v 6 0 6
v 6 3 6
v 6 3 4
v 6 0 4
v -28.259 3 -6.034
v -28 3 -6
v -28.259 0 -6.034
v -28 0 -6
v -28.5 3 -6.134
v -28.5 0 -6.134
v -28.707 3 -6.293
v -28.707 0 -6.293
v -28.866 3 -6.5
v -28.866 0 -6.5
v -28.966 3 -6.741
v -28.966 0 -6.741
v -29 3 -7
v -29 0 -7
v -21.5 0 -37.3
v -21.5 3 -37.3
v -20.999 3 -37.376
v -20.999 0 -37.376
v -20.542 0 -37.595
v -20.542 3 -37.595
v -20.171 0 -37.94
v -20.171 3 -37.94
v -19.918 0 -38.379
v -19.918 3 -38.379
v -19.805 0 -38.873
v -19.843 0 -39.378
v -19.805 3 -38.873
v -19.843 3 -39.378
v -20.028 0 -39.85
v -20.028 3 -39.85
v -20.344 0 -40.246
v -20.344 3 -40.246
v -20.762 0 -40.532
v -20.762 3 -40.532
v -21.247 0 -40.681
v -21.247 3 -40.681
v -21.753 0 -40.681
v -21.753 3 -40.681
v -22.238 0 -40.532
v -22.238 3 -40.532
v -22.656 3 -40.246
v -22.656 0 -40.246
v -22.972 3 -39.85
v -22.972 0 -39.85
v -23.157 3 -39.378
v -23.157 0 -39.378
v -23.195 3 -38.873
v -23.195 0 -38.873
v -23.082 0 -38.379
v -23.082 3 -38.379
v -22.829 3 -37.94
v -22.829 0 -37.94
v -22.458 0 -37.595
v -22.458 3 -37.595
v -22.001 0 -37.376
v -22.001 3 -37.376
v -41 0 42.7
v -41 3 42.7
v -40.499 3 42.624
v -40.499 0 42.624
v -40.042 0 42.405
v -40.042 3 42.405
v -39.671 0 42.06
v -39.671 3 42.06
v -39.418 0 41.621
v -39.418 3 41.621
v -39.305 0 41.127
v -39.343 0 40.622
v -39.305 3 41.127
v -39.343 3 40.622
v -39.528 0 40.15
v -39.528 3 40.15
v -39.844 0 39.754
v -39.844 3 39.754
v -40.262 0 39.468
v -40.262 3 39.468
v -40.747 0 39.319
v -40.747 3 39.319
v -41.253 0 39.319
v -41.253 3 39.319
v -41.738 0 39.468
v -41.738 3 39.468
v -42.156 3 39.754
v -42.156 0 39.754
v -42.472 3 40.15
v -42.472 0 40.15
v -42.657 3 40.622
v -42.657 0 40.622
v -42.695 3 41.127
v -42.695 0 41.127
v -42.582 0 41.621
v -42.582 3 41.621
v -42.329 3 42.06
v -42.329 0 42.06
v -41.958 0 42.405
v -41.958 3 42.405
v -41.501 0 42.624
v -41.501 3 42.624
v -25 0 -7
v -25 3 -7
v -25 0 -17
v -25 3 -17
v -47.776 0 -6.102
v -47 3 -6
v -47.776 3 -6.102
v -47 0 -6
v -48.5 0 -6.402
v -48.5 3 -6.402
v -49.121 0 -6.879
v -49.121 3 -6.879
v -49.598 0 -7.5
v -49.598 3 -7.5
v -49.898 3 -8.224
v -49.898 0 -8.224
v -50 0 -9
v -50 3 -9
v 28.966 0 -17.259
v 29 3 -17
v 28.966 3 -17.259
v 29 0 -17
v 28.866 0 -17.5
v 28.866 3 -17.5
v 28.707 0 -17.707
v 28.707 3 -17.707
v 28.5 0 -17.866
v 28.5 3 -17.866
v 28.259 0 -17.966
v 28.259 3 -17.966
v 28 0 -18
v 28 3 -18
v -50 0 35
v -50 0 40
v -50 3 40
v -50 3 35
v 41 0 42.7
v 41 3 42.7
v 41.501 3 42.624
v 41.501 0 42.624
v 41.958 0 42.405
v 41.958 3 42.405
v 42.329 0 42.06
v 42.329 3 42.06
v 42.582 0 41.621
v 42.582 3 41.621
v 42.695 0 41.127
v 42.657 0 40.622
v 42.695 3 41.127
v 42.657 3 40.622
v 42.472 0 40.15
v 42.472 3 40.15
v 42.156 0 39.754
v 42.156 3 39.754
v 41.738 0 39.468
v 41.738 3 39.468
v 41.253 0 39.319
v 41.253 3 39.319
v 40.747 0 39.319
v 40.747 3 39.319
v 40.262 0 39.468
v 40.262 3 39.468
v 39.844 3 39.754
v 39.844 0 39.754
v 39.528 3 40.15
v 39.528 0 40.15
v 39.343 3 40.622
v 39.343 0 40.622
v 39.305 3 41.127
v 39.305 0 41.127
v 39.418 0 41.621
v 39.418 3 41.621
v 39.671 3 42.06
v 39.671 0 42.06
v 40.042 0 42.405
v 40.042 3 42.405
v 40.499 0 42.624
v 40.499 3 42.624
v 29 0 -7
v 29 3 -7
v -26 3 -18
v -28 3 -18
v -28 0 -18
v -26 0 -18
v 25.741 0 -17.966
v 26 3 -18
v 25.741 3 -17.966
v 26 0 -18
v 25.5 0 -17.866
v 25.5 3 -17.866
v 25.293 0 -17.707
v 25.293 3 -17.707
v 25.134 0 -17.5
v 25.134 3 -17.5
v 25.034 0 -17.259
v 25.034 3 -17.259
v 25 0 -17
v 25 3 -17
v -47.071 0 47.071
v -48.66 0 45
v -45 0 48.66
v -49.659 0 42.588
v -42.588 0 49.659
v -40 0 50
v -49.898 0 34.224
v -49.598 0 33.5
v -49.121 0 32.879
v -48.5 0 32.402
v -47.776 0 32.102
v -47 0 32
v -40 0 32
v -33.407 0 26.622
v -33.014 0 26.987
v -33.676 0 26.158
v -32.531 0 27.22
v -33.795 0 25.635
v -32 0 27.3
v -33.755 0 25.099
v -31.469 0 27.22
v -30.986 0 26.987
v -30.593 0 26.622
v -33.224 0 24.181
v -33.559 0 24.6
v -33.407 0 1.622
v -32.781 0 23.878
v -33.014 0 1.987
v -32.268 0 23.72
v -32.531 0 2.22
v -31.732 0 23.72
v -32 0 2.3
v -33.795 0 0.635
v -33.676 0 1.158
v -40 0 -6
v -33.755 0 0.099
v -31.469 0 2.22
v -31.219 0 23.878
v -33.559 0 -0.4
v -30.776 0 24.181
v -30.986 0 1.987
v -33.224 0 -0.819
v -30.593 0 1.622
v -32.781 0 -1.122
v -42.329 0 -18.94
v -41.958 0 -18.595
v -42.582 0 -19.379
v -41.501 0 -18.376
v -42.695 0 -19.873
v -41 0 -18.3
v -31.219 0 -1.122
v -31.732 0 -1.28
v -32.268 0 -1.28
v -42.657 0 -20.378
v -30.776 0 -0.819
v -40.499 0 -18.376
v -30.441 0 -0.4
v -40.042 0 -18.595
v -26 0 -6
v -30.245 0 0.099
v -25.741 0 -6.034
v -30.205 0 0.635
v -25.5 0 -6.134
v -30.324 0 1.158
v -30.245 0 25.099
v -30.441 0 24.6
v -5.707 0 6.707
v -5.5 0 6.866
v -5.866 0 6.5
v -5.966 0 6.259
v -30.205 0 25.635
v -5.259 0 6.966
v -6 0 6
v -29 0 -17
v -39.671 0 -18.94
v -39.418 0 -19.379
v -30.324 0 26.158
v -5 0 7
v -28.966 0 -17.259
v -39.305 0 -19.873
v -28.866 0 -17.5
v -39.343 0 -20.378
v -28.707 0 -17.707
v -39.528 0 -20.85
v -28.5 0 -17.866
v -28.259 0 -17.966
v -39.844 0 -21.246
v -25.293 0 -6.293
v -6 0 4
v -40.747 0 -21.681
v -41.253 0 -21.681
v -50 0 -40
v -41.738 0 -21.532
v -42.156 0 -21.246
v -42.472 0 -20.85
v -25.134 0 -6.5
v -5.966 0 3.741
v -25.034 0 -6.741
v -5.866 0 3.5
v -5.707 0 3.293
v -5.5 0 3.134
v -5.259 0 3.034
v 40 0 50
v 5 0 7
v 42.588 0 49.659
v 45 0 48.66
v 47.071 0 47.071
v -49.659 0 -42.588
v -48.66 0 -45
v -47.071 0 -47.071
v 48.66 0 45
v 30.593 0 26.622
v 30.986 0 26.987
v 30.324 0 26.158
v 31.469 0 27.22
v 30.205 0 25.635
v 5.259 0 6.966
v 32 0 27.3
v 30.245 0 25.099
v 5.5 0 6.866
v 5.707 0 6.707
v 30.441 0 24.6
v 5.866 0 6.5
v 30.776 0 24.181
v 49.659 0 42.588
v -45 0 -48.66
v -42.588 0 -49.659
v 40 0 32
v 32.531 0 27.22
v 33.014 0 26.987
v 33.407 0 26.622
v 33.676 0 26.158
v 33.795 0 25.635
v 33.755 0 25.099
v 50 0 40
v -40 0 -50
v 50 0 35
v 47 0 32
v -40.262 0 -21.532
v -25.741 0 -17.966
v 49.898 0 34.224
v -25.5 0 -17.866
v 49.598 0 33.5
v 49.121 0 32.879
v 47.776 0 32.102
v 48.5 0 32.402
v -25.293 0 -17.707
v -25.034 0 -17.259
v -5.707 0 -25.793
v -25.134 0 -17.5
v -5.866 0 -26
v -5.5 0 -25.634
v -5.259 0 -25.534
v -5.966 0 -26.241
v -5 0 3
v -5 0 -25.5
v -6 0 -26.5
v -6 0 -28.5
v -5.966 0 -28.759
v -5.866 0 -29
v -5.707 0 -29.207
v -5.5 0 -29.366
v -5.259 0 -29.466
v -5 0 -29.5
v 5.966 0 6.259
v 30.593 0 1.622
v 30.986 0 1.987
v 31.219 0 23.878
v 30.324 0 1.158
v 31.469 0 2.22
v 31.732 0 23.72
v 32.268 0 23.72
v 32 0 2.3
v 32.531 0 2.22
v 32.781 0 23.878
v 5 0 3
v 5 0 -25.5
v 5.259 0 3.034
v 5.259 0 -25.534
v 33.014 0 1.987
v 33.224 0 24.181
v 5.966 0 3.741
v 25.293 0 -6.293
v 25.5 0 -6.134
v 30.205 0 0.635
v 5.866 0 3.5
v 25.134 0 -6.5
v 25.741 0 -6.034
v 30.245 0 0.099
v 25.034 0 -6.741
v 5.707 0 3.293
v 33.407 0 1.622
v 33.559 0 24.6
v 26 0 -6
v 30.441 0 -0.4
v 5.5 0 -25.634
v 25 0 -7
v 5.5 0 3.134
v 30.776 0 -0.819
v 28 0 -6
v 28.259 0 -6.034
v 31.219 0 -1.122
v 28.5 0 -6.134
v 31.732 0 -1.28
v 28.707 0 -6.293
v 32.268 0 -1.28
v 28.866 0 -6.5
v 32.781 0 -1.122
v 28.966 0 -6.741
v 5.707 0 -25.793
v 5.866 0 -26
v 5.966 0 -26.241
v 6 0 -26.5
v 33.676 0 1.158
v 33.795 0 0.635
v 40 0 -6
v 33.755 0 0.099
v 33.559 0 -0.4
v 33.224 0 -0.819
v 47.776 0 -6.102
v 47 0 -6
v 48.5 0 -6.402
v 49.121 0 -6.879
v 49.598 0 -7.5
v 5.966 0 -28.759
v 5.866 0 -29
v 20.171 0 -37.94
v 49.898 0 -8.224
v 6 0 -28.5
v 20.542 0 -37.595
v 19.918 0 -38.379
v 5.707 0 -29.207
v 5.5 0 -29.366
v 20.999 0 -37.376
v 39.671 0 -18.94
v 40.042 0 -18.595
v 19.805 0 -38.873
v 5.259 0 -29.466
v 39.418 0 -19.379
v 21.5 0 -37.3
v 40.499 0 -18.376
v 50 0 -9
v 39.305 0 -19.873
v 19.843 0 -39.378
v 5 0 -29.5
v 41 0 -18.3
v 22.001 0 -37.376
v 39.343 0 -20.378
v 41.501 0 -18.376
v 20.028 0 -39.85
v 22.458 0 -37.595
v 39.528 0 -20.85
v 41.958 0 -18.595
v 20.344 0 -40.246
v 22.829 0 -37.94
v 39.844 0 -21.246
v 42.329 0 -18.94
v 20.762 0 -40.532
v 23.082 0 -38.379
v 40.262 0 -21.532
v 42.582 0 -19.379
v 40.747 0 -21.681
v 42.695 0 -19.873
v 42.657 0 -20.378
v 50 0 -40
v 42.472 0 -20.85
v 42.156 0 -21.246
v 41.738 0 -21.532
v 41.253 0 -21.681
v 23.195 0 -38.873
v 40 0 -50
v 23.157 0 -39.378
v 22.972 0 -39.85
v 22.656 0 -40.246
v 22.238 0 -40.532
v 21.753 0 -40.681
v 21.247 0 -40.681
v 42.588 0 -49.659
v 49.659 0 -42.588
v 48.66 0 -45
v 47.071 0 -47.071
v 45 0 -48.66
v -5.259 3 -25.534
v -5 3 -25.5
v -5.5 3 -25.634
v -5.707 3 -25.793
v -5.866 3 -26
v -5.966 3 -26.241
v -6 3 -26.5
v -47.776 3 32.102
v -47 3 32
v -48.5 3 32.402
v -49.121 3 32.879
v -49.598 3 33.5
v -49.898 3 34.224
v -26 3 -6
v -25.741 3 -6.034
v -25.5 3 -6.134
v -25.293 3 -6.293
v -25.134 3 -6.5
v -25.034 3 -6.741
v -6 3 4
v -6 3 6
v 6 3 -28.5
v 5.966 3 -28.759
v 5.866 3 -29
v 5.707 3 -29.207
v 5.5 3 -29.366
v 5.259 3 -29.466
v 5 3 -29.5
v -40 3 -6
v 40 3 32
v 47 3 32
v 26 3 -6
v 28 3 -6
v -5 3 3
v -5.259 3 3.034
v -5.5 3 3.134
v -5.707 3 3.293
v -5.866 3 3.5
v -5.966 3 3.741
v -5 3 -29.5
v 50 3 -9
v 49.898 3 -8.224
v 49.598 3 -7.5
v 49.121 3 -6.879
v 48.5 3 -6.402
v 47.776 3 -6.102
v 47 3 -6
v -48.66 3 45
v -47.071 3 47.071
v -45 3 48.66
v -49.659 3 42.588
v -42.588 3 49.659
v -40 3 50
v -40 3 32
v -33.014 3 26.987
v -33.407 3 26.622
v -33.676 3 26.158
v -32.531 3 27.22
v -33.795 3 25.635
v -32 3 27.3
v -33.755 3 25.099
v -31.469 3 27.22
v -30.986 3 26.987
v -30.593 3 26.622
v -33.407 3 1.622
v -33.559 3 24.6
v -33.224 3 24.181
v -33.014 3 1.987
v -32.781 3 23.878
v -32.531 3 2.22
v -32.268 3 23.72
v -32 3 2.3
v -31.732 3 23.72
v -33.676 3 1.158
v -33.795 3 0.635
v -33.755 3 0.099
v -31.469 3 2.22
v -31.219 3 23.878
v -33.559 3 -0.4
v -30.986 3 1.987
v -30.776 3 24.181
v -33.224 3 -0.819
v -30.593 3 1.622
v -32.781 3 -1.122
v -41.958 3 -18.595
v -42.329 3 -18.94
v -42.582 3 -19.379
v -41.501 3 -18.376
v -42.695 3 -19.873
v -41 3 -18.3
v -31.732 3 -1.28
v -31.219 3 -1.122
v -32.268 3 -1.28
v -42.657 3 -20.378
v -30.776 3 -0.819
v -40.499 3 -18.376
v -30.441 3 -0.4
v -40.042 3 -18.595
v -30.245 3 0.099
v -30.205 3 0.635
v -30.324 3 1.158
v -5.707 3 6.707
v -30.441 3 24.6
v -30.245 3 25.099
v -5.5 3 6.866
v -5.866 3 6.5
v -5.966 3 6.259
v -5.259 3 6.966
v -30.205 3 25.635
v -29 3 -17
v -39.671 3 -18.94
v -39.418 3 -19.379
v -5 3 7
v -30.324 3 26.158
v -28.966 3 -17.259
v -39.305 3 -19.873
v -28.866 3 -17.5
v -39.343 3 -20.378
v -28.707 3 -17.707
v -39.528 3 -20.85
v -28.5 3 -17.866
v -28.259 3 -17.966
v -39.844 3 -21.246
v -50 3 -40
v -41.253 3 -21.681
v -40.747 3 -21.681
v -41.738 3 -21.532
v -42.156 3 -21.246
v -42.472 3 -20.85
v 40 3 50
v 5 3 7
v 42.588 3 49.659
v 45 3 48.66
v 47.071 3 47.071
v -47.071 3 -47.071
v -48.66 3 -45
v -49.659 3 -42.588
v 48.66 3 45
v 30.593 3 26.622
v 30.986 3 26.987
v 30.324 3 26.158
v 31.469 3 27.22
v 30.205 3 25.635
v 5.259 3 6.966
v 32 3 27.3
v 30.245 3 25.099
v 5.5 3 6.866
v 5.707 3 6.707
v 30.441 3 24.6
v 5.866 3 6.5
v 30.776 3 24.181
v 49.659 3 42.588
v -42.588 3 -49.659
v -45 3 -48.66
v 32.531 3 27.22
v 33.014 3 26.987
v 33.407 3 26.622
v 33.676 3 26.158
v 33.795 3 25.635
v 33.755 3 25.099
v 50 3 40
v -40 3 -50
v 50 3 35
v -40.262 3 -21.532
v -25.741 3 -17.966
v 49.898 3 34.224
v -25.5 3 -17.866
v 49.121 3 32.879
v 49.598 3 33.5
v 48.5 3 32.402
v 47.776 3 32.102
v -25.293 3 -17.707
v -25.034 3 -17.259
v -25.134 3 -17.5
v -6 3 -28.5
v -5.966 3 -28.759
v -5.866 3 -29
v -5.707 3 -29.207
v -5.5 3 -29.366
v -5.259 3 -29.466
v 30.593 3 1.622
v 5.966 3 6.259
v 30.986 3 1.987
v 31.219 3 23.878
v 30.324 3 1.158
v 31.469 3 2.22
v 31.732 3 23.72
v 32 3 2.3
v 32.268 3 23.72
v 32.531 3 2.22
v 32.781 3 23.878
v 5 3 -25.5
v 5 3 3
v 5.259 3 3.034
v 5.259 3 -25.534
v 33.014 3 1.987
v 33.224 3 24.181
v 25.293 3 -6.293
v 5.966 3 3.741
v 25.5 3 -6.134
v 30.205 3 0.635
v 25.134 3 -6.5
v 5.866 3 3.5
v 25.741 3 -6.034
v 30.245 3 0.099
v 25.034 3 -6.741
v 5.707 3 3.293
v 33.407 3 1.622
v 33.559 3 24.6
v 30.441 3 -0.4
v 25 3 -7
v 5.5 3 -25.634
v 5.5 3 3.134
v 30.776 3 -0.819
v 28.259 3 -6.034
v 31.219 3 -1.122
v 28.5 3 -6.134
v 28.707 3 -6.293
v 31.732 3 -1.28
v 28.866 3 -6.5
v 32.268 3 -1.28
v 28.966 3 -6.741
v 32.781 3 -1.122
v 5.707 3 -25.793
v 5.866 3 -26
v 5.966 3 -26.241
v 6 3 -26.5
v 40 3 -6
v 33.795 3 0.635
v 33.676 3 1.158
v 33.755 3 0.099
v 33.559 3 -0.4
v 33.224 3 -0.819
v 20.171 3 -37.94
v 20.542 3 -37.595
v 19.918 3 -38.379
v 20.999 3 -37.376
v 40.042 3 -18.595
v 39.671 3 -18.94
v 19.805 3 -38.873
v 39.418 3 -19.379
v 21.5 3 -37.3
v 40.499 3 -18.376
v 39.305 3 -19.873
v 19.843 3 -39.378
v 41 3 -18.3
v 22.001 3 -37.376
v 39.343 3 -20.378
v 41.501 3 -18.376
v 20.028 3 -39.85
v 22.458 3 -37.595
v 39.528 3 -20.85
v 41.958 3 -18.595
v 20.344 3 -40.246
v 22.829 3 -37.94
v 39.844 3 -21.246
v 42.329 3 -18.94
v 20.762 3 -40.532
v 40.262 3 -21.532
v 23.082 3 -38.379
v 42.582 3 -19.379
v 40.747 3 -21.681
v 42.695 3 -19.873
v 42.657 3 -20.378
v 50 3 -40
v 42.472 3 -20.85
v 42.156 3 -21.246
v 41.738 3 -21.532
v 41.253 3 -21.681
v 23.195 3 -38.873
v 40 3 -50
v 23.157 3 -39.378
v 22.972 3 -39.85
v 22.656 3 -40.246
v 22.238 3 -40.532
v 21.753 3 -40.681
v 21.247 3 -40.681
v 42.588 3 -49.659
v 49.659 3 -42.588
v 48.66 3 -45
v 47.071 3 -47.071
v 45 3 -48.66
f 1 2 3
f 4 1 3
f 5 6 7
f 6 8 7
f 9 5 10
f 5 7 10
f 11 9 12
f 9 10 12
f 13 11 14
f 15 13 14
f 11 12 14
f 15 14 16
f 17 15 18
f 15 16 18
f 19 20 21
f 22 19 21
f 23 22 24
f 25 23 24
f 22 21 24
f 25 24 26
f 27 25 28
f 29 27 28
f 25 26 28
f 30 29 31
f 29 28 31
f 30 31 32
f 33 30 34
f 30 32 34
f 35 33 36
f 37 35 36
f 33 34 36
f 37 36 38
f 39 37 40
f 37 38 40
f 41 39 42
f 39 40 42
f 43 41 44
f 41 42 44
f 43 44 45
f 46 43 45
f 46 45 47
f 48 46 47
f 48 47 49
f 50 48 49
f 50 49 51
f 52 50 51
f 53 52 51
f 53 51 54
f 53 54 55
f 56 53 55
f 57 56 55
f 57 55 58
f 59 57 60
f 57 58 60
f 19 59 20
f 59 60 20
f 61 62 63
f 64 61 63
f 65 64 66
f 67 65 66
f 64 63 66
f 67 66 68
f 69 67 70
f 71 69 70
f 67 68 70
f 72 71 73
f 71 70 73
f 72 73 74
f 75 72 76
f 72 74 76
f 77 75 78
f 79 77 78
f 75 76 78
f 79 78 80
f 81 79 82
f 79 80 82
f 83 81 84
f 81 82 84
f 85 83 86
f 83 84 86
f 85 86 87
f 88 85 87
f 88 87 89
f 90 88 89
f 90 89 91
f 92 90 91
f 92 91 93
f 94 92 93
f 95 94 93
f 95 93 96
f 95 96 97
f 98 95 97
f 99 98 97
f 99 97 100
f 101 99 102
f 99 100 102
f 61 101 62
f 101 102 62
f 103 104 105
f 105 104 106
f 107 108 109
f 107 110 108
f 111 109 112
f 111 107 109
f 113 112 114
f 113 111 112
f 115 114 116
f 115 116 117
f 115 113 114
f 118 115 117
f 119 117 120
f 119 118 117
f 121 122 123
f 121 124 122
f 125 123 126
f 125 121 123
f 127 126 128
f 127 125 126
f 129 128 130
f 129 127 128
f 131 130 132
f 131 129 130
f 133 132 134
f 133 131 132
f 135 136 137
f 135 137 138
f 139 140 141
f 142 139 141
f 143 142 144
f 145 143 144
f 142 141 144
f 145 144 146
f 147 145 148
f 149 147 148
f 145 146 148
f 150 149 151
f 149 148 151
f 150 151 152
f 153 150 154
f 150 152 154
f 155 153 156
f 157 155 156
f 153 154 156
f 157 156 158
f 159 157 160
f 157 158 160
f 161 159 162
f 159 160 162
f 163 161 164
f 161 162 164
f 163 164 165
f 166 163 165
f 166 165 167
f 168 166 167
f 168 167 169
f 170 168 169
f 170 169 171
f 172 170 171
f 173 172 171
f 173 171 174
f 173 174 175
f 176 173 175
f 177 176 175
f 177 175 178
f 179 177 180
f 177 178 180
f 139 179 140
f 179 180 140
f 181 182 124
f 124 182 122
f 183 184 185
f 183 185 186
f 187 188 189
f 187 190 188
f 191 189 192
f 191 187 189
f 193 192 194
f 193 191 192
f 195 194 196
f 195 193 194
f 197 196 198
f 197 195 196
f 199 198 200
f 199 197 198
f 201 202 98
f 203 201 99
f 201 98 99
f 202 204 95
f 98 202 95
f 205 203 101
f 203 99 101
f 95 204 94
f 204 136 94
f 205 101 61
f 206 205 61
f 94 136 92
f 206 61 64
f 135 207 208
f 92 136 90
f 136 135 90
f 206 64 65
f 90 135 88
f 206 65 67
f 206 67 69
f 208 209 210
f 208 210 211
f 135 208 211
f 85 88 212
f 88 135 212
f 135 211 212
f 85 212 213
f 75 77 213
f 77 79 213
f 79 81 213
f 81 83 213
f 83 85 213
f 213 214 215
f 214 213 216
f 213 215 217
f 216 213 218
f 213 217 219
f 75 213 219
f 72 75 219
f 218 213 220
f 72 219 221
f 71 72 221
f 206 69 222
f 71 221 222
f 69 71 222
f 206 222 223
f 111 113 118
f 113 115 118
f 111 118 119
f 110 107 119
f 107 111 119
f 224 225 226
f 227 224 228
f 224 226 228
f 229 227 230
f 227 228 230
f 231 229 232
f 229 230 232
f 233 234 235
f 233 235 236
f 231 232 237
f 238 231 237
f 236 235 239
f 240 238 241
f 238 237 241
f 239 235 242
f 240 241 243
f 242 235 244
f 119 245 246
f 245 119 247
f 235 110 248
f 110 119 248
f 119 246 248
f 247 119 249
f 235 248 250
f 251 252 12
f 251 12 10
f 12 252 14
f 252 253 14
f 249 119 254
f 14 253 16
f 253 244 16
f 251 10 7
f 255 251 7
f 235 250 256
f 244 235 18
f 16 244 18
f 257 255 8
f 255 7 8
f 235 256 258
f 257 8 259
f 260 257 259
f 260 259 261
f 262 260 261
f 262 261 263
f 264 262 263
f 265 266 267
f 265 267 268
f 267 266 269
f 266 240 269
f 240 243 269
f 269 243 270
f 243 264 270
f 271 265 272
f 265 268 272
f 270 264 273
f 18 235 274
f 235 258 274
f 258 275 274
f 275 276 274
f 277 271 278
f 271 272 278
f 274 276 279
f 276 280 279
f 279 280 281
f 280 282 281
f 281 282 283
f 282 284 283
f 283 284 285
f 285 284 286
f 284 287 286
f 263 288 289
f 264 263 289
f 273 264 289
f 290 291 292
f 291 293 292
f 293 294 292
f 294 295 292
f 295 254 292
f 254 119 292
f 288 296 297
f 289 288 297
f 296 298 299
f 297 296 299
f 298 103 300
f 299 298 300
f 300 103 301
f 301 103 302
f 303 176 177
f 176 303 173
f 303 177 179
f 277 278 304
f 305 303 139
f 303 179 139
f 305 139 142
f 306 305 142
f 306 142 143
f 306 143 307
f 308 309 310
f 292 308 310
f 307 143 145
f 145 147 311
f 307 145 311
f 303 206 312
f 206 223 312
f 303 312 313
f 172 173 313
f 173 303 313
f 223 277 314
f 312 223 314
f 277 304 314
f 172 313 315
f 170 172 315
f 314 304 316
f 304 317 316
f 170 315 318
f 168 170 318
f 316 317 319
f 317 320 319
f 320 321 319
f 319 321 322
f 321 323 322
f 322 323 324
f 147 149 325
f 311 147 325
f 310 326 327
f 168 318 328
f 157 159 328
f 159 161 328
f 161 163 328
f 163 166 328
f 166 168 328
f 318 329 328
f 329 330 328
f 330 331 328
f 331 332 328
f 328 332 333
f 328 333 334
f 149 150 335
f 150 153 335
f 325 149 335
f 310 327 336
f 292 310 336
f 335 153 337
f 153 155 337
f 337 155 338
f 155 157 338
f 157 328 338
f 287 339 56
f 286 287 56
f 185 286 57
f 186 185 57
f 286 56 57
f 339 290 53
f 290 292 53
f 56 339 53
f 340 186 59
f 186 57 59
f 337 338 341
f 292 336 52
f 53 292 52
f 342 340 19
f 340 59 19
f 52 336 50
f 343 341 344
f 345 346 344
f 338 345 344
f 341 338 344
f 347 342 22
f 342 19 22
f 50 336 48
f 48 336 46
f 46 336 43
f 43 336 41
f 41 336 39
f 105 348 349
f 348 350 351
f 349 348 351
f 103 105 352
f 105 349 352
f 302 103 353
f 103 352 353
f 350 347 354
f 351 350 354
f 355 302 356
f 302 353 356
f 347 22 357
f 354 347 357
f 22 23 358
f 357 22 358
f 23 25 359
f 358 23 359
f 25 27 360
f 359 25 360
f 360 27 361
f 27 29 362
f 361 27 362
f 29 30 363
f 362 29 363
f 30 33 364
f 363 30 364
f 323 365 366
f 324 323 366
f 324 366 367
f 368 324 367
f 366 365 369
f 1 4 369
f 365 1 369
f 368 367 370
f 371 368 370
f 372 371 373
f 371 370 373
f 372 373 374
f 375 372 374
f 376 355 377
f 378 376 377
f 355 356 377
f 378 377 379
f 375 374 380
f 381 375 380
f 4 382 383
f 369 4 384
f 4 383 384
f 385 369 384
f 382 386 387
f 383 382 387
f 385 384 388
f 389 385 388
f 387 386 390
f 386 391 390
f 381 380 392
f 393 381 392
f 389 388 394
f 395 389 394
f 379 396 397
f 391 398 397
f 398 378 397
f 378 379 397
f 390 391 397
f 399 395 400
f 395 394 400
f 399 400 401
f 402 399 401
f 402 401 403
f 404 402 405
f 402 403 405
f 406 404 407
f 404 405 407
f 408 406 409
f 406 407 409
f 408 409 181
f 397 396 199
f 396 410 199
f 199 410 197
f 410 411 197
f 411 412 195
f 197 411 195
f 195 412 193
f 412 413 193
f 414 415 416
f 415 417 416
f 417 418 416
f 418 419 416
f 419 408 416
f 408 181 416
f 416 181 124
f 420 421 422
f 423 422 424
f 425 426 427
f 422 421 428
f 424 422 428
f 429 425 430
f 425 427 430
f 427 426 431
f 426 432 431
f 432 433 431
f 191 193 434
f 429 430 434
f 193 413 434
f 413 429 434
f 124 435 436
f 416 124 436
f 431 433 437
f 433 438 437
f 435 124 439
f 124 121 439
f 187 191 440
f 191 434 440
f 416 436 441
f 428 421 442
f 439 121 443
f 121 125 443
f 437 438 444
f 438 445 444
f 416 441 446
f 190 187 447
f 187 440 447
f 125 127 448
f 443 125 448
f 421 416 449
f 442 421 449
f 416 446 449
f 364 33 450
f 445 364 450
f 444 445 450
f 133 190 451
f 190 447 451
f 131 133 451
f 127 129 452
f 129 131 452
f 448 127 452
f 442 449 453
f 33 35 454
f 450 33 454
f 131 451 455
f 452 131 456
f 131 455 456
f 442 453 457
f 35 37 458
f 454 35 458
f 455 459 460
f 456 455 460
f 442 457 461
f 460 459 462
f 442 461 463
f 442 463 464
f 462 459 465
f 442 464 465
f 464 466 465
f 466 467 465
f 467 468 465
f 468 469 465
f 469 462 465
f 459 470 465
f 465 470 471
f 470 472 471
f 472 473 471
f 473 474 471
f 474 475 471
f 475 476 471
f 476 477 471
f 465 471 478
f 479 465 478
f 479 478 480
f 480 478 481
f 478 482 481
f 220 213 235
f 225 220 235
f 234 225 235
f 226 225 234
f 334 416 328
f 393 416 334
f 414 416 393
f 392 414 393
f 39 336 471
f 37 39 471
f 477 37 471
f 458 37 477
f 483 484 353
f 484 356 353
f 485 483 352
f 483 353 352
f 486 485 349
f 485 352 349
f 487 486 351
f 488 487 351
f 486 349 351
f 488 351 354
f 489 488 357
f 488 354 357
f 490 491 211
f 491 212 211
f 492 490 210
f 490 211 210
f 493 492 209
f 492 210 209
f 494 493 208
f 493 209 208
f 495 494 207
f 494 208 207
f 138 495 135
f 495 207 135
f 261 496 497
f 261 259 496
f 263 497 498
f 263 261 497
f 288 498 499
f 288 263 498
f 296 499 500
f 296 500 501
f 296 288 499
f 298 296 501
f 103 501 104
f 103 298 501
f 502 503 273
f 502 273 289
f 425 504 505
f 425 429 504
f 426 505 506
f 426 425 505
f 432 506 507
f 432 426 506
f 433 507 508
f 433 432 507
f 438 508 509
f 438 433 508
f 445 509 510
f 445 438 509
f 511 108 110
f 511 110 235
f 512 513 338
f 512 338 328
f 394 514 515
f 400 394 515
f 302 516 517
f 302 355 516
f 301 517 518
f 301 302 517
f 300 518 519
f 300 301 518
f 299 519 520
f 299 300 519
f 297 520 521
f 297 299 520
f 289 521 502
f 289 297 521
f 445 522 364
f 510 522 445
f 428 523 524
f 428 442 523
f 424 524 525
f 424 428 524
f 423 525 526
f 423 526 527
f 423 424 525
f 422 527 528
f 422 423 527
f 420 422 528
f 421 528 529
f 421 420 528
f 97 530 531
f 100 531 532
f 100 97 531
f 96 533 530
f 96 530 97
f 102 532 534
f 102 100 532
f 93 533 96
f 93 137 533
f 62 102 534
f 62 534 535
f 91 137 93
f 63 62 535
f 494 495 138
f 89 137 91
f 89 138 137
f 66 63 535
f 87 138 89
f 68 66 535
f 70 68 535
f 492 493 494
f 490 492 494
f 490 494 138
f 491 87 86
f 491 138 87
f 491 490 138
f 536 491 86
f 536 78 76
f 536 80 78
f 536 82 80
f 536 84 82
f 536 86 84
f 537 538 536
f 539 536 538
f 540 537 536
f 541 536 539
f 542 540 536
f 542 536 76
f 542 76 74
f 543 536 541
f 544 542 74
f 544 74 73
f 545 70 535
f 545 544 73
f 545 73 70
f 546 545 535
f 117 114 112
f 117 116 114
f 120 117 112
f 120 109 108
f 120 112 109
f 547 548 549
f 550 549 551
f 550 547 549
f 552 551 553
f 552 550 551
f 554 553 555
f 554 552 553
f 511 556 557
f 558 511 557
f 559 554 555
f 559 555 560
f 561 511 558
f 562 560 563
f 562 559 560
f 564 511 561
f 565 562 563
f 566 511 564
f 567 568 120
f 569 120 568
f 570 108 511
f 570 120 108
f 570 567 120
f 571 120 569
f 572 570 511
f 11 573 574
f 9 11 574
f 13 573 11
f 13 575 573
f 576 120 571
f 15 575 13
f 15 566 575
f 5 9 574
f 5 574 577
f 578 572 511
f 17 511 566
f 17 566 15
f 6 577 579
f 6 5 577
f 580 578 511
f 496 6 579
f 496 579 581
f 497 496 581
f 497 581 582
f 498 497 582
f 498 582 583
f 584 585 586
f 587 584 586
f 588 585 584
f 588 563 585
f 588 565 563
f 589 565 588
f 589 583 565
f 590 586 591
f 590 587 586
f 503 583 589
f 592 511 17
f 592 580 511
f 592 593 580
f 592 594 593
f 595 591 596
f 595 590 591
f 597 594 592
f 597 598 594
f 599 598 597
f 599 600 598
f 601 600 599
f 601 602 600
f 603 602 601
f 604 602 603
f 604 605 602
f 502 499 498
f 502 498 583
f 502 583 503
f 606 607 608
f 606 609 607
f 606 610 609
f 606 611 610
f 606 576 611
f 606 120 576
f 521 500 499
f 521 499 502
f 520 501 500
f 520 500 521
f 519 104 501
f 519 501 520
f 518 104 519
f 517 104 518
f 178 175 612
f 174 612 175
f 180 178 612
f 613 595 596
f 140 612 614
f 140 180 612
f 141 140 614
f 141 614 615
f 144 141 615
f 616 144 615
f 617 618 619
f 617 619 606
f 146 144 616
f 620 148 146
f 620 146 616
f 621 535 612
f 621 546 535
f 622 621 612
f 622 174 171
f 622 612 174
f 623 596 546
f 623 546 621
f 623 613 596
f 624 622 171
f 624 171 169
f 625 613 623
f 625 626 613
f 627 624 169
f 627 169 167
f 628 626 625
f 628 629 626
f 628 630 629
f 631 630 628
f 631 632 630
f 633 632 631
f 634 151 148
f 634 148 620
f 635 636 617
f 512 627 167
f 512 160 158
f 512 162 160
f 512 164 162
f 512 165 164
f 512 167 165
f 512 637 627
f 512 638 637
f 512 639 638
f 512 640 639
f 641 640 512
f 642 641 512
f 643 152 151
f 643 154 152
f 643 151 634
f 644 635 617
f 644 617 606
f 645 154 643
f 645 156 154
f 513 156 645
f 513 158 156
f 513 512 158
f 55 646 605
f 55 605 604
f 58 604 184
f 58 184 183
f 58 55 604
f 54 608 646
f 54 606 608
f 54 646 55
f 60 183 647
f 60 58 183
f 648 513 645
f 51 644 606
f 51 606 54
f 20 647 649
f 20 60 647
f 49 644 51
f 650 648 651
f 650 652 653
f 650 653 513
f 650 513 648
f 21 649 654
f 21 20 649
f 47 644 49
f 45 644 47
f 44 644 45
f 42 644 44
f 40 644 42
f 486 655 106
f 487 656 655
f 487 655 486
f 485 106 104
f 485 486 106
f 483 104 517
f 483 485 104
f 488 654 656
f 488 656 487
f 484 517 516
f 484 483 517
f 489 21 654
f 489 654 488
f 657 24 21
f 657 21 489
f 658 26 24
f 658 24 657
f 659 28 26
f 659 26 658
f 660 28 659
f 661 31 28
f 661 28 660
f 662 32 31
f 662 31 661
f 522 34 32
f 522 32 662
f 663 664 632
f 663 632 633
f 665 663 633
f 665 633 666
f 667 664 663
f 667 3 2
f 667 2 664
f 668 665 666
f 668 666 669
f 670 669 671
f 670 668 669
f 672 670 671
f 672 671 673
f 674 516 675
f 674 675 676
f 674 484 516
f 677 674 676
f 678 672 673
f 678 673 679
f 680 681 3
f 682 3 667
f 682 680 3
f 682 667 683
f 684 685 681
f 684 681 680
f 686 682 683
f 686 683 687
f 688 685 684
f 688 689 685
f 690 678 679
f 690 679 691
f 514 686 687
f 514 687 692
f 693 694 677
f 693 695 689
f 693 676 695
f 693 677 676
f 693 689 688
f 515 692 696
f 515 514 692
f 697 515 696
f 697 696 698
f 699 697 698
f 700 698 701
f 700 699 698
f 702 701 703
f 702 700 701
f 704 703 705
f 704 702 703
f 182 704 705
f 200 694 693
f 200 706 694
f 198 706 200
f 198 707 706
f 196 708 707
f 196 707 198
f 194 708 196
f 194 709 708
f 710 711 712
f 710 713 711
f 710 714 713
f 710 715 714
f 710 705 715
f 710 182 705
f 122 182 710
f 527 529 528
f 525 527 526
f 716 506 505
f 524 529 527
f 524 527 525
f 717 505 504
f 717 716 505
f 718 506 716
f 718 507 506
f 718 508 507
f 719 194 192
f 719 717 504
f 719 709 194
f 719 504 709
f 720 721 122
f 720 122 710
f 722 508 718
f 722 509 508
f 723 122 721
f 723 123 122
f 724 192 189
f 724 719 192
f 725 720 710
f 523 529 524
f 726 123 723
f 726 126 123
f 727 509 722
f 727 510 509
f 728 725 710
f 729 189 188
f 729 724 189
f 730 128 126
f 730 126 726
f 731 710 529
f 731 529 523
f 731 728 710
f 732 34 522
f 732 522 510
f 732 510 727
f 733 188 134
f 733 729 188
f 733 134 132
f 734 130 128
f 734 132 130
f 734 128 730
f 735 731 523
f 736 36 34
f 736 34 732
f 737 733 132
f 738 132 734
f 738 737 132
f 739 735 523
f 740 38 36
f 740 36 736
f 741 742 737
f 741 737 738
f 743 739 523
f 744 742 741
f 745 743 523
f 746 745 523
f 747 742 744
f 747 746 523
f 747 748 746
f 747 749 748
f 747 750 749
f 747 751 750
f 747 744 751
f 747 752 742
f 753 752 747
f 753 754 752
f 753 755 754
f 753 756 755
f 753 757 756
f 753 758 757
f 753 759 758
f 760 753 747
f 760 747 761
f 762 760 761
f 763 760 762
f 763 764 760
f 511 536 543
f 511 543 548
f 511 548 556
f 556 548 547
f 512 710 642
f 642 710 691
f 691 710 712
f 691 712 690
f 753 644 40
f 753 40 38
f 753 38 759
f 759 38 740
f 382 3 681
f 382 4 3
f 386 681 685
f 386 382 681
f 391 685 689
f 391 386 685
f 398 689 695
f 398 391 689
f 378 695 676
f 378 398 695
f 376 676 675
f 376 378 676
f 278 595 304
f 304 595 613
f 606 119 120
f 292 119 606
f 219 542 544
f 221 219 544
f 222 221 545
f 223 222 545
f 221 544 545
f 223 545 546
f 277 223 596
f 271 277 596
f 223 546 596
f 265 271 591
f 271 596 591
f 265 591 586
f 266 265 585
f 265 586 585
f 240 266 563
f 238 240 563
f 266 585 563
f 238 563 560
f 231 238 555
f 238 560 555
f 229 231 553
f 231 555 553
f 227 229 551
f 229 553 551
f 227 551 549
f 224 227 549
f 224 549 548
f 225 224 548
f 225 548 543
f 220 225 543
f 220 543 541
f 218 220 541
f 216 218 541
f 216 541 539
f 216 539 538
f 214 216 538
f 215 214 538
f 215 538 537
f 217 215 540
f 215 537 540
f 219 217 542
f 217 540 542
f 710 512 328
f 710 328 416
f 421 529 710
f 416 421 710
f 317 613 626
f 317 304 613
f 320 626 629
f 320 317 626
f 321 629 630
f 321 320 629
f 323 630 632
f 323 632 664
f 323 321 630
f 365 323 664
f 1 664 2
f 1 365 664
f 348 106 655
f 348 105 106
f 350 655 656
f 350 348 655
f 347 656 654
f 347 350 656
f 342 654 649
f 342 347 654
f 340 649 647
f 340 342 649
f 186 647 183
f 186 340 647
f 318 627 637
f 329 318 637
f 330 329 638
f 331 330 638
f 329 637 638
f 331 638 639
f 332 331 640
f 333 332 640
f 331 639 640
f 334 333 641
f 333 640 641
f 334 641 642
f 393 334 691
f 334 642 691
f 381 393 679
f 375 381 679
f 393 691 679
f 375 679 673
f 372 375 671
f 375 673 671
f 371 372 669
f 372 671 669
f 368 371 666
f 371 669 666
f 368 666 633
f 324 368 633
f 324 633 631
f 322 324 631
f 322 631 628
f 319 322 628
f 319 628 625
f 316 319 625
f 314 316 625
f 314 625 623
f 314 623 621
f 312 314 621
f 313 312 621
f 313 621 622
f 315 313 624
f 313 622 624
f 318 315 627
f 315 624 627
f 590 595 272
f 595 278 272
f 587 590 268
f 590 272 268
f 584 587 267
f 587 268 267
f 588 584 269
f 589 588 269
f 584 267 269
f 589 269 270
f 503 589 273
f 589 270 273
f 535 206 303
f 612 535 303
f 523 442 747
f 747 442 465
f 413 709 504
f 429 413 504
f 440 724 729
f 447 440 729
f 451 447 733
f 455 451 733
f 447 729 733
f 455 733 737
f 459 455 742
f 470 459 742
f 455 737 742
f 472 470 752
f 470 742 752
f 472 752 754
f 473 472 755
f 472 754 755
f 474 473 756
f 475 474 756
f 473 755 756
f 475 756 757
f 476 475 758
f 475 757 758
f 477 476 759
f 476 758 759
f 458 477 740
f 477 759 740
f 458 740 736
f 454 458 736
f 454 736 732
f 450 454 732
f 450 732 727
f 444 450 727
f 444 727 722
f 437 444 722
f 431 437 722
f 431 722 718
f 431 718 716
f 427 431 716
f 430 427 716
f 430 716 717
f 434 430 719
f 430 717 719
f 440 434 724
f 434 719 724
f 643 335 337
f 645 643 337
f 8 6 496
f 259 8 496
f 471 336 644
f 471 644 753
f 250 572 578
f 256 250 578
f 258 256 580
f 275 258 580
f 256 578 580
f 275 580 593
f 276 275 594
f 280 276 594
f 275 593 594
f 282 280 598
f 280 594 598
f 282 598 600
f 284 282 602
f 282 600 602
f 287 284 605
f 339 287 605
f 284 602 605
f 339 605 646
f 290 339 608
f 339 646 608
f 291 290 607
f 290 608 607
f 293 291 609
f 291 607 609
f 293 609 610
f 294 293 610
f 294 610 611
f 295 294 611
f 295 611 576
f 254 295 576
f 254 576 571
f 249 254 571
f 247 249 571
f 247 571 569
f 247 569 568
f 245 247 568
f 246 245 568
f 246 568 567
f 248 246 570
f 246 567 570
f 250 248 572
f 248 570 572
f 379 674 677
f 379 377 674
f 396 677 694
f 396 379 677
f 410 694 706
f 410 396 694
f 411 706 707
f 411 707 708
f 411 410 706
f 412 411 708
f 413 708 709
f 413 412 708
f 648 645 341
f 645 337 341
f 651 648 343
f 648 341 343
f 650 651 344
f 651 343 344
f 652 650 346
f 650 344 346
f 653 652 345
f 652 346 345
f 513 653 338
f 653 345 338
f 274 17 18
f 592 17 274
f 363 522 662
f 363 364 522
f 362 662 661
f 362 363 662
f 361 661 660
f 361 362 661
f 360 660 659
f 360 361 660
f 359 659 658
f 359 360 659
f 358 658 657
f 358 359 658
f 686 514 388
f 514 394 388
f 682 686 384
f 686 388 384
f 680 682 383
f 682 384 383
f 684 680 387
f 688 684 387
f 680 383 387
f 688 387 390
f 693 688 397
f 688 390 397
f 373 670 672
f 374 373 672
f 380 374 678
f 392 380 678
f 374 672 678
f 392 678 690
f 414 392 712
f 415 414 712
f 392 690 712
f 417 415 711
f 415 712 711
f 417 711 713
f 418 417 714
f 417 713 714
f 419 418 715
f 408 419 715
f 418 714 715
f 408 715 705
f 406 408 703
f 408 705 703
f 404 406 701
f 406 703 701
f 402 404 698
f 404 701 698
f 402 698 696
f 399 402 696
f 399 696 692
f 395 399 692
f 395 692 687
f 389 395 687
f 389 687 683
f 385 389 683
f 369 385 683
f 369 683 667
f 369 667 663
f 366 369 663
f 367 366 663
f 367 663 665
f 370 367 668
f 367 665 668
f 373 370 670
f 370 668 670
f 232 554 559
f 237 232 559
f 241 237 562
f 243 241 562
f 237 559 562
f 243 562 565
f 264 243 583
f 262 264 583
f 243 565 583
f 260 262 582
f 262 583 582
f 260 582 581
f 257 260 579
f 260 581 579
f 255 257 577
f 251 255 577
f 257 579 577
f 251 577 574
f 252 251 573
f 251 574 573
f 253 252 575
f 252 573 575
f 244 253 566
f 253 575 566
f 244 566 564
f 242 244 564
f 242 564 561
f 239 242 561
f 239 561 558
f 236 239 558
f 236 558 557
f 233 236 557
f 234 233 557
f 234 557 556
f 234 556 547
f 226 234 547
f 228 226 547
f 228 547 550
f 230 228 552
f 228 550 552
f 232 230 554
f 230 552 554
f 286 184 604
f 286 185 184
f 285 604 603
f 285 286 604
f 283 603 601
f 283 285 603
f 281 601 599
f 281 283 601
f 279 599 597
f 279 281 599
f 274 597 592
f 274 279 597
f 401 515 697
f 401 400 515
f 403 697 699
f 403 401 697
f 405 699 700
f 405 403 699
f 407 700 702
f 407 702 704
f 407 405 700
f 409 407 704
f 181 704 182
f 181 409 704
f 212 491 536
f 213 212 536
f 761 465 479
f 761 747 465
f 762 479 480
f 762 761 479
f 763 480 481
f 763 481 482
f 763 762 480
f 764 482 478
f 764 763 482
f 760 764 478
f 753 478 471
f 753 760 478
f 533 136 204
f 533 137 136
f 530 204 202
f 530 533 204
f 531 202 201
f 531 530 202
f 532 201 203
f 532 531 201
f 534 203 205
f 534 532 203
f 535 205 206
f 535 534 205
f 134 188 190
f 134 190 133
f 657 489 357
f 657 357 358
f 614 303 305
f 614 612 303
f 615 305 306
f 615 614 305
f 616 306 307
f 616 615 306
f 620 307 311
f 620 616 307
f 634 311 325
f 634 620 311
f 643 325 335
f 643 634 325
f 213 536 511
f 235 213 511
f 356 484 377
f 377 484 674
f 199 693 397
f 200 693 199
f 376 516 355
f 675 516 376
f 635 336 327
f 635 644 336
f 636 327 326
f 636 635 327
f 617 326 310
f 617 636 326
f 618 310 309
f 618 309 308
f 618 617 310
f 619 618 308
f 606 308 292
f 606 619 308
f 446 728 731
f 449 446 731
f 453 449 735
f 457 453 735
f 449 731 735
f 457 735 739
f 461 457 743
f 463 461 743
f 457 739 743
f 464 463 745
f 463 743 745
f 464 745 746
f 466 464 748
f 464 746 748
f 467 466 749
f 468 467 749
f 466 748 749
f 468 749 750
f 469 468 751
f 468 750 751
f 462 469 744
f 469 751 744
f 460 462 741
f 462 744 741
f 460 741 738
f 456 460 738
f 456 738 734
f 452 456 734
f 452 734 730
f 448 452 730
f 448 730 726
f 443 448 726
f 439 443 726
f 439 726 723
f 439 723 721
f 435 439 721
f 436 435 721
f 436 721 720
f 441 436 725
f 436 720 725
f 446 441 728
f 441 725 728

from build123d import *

# Parameters (mm, degrees)
SKETCH1_W           = 100
SKETCH1_H           = 100
BOSS_EXTRUDE1_DEPTH = 3
SKETCH4_R           = 1.7
CUT_EXTRUDE3_DEPTH  = 3
SKETCH2_W           = 10
SKETCH2_H           = 38
CUT_EXTRUDE4_DEPTH  = 3
SKETCH5_R           = 1.8
SKETCH5_R_2         = 1.7
SKETCH5_W           = 12
SKETCH5_H           = 4
SKETCH5_W_2         = 4
SKETCH5_H_2         = 12
CUT_EXTRUDE5_DEPTH  = 3
FILLET1_R           = 10
FILLET2_R           = 3
FILLET3_R           = 10
FILLET4_R           = 3
FILLET5_R           = 3
FILLET6_R           = 1


with BuildPart() as part:
    # Sketch1 → Boss-Extrude1 (new body)
    with BuildSketch(Plane(origin=(0, 0, 0), x_dir=(1, 0, 0), z_dir=(0, 1, 0))):
        Rectangle(SKETCH1_W, SKETCH1_H)
    extrude(amount=BOSS_EXTRUDE1_DEPTH)

    # Sketch4 → Cut-Extrude3 (cut)
    with BuildSketch(Plane(origin=(0, 3, 0), x_dir=(1, 0, 0), z_dir=(0, 1, 0))):
        with Locations(Location((-41, 20, 0), (0, 0, 270))):
            Circle(SKETCH4_R)
        with Locations(Location((-41, -41, 0), (0, 0, 270))):
            Circle(SKETCH4_R)
        with Locations(Location((41, -41, 0), (0, 0, 270))):
            Circle(SKETCH4_R)
        with Locations(Location((41, 20, 0), (0, 0, 270))):
            Circle(SKETCH4_R)
    extrude(amount=-CUT_EXTRUDE3_DEPTH, mode=Mode.SUBTRACT)

    # Sketch2 → Cut-Extrude4 (cut)
    with BuildSketch(Plane(origin=(0, 3, 0), x_dir=(1, 0, 0), z_dir=(0, 1, 0))):
        with Locations((-45, -13)):
            Rectangle(SKETCH2_W, SKETCH2_H)
    cut_extrude4 = extrude(amount=-CUT_EXTRUDE4_DEPTH, mode=Mode.SUBTRACT)

    # Mirror2: Cut-Extrude4 across plane
    add(cut_extrude4.mirror(Plane(origin=(0, 0, 0), x_dir=(0, 0, 1), z_dir=(1, 0, 0))), mode=Mode.SUBTRACT)

    # Sketch5 → Cut-Extrude5 (cut)
    with BuildSketch(Plane(origin=(0, 3, 0), x_dir=(1, 0, 0), z_dir=(0, 1, 0))):
        with Locations(Location((-32, -0.5, 0), (0, 0, 270))):
            Circle(SKETCH5_R)
        with Locations(Location((-32, -25.5, 0), (0, 0, 270))):
            Circle(SKETCH5_R)
        with Locations(Location((32, -25.5, 0), (0, 0, 270))):
            Circle(SKETCH5_R)
        with Locations(Location((32, -0.5, 0), (0, 0, 270))):
            Circle(SKETCH5_R)
        with Locations(Location((-21.5, 39, 0), (0, 0, 270))):
            Circle(SKETCH5_R_2)
        with Locations(Location((21.5, 39, 0), (0, 0, 270))):
            Circle(SKETCH5_R_2)
        with Locations((0, -5)):
            Rectangle(SKETCH5_W, SKETCH5_H)
        with Locations((0, 27.5)):
            Rectangle(SKETCH5_W, SKETCH5_H)
        with Locations((-27, 12)):
            Rectangle(SKETCH5_W_2, SKETCH5_H_2)
        with Locations((27, 12)):
            Rectangle(SKETCH5_W_2, SKETCH5_H_2)
    extrude(amount=-CUT_EXTRUDE5_DEPTH, mode=Mode.SUBTRACT)

    # Fillet1
    fillet1_edges = [part.edges().sort_by_distance(p)[0] for p in [
        (-50, 1.5, 50),
        (50, 1.5, 50),
    ]]
    fillet(fillet1_edges, radius=FILLET1_R)

    # Fillet2
    fillet2_edges = [part.edges().sort_by_distance(p)[0] for p in [
        (50, 1.5, -6),
        (50, 1.5, 32),
    ]]
    fillet(fillet2_edges, radius=FILLET2_R)

    # Fillet3
    fillet3_edges = [part.edges().sort_by_distance(p)[0] for p in [
        (-50, 1.5, -50),
        (50, 1.5, -50),
    ]]
    fillet(fillet3_edges, radius=FILLET3_R)

    # Fillet4
    fillet4_edges = [part.edges().sort_by_distance(p)[0] for p in [
        (-50, 1.5, 32),
    ]]
    fillet(fillet4_edges, radius=FILLET4_R)

    # Fillet5
    fillet5_edges = [part.edges().sort_by_distance(p)[0] for p in [
        (-50, 1.5, -6),
    ]]
    fillet(fillet5_edges, radius=FILLET5_R)

    # Fillet6
    fillet6_edges = [part.edges().sort_by_distance(p)[0] for p in [
        (-29, 1.5, -18),
        (-29, 1.5, -6),
        (-25, 1.5, -6),
        (-25, 1.5, -18),
        (25, 1.5, -18),
        (25, 1.5, -6),
        (29, 1.5, -6),
        (29, 1.5, -18),
        (-6, 1.5, 3),
        (-6, 1.5, 7),
        (6, 1.5, 7),
        (6, 1.5, 3),
        (-6, 1.5, -29.5),
        (-6, 1.5, -25.5),
        (6, 1.5, -25.5),
        (6, 1.5, -29.5),
    ]]
    fillet(fillet6_edges, radius=FILLET6_R)


solid = part.part
